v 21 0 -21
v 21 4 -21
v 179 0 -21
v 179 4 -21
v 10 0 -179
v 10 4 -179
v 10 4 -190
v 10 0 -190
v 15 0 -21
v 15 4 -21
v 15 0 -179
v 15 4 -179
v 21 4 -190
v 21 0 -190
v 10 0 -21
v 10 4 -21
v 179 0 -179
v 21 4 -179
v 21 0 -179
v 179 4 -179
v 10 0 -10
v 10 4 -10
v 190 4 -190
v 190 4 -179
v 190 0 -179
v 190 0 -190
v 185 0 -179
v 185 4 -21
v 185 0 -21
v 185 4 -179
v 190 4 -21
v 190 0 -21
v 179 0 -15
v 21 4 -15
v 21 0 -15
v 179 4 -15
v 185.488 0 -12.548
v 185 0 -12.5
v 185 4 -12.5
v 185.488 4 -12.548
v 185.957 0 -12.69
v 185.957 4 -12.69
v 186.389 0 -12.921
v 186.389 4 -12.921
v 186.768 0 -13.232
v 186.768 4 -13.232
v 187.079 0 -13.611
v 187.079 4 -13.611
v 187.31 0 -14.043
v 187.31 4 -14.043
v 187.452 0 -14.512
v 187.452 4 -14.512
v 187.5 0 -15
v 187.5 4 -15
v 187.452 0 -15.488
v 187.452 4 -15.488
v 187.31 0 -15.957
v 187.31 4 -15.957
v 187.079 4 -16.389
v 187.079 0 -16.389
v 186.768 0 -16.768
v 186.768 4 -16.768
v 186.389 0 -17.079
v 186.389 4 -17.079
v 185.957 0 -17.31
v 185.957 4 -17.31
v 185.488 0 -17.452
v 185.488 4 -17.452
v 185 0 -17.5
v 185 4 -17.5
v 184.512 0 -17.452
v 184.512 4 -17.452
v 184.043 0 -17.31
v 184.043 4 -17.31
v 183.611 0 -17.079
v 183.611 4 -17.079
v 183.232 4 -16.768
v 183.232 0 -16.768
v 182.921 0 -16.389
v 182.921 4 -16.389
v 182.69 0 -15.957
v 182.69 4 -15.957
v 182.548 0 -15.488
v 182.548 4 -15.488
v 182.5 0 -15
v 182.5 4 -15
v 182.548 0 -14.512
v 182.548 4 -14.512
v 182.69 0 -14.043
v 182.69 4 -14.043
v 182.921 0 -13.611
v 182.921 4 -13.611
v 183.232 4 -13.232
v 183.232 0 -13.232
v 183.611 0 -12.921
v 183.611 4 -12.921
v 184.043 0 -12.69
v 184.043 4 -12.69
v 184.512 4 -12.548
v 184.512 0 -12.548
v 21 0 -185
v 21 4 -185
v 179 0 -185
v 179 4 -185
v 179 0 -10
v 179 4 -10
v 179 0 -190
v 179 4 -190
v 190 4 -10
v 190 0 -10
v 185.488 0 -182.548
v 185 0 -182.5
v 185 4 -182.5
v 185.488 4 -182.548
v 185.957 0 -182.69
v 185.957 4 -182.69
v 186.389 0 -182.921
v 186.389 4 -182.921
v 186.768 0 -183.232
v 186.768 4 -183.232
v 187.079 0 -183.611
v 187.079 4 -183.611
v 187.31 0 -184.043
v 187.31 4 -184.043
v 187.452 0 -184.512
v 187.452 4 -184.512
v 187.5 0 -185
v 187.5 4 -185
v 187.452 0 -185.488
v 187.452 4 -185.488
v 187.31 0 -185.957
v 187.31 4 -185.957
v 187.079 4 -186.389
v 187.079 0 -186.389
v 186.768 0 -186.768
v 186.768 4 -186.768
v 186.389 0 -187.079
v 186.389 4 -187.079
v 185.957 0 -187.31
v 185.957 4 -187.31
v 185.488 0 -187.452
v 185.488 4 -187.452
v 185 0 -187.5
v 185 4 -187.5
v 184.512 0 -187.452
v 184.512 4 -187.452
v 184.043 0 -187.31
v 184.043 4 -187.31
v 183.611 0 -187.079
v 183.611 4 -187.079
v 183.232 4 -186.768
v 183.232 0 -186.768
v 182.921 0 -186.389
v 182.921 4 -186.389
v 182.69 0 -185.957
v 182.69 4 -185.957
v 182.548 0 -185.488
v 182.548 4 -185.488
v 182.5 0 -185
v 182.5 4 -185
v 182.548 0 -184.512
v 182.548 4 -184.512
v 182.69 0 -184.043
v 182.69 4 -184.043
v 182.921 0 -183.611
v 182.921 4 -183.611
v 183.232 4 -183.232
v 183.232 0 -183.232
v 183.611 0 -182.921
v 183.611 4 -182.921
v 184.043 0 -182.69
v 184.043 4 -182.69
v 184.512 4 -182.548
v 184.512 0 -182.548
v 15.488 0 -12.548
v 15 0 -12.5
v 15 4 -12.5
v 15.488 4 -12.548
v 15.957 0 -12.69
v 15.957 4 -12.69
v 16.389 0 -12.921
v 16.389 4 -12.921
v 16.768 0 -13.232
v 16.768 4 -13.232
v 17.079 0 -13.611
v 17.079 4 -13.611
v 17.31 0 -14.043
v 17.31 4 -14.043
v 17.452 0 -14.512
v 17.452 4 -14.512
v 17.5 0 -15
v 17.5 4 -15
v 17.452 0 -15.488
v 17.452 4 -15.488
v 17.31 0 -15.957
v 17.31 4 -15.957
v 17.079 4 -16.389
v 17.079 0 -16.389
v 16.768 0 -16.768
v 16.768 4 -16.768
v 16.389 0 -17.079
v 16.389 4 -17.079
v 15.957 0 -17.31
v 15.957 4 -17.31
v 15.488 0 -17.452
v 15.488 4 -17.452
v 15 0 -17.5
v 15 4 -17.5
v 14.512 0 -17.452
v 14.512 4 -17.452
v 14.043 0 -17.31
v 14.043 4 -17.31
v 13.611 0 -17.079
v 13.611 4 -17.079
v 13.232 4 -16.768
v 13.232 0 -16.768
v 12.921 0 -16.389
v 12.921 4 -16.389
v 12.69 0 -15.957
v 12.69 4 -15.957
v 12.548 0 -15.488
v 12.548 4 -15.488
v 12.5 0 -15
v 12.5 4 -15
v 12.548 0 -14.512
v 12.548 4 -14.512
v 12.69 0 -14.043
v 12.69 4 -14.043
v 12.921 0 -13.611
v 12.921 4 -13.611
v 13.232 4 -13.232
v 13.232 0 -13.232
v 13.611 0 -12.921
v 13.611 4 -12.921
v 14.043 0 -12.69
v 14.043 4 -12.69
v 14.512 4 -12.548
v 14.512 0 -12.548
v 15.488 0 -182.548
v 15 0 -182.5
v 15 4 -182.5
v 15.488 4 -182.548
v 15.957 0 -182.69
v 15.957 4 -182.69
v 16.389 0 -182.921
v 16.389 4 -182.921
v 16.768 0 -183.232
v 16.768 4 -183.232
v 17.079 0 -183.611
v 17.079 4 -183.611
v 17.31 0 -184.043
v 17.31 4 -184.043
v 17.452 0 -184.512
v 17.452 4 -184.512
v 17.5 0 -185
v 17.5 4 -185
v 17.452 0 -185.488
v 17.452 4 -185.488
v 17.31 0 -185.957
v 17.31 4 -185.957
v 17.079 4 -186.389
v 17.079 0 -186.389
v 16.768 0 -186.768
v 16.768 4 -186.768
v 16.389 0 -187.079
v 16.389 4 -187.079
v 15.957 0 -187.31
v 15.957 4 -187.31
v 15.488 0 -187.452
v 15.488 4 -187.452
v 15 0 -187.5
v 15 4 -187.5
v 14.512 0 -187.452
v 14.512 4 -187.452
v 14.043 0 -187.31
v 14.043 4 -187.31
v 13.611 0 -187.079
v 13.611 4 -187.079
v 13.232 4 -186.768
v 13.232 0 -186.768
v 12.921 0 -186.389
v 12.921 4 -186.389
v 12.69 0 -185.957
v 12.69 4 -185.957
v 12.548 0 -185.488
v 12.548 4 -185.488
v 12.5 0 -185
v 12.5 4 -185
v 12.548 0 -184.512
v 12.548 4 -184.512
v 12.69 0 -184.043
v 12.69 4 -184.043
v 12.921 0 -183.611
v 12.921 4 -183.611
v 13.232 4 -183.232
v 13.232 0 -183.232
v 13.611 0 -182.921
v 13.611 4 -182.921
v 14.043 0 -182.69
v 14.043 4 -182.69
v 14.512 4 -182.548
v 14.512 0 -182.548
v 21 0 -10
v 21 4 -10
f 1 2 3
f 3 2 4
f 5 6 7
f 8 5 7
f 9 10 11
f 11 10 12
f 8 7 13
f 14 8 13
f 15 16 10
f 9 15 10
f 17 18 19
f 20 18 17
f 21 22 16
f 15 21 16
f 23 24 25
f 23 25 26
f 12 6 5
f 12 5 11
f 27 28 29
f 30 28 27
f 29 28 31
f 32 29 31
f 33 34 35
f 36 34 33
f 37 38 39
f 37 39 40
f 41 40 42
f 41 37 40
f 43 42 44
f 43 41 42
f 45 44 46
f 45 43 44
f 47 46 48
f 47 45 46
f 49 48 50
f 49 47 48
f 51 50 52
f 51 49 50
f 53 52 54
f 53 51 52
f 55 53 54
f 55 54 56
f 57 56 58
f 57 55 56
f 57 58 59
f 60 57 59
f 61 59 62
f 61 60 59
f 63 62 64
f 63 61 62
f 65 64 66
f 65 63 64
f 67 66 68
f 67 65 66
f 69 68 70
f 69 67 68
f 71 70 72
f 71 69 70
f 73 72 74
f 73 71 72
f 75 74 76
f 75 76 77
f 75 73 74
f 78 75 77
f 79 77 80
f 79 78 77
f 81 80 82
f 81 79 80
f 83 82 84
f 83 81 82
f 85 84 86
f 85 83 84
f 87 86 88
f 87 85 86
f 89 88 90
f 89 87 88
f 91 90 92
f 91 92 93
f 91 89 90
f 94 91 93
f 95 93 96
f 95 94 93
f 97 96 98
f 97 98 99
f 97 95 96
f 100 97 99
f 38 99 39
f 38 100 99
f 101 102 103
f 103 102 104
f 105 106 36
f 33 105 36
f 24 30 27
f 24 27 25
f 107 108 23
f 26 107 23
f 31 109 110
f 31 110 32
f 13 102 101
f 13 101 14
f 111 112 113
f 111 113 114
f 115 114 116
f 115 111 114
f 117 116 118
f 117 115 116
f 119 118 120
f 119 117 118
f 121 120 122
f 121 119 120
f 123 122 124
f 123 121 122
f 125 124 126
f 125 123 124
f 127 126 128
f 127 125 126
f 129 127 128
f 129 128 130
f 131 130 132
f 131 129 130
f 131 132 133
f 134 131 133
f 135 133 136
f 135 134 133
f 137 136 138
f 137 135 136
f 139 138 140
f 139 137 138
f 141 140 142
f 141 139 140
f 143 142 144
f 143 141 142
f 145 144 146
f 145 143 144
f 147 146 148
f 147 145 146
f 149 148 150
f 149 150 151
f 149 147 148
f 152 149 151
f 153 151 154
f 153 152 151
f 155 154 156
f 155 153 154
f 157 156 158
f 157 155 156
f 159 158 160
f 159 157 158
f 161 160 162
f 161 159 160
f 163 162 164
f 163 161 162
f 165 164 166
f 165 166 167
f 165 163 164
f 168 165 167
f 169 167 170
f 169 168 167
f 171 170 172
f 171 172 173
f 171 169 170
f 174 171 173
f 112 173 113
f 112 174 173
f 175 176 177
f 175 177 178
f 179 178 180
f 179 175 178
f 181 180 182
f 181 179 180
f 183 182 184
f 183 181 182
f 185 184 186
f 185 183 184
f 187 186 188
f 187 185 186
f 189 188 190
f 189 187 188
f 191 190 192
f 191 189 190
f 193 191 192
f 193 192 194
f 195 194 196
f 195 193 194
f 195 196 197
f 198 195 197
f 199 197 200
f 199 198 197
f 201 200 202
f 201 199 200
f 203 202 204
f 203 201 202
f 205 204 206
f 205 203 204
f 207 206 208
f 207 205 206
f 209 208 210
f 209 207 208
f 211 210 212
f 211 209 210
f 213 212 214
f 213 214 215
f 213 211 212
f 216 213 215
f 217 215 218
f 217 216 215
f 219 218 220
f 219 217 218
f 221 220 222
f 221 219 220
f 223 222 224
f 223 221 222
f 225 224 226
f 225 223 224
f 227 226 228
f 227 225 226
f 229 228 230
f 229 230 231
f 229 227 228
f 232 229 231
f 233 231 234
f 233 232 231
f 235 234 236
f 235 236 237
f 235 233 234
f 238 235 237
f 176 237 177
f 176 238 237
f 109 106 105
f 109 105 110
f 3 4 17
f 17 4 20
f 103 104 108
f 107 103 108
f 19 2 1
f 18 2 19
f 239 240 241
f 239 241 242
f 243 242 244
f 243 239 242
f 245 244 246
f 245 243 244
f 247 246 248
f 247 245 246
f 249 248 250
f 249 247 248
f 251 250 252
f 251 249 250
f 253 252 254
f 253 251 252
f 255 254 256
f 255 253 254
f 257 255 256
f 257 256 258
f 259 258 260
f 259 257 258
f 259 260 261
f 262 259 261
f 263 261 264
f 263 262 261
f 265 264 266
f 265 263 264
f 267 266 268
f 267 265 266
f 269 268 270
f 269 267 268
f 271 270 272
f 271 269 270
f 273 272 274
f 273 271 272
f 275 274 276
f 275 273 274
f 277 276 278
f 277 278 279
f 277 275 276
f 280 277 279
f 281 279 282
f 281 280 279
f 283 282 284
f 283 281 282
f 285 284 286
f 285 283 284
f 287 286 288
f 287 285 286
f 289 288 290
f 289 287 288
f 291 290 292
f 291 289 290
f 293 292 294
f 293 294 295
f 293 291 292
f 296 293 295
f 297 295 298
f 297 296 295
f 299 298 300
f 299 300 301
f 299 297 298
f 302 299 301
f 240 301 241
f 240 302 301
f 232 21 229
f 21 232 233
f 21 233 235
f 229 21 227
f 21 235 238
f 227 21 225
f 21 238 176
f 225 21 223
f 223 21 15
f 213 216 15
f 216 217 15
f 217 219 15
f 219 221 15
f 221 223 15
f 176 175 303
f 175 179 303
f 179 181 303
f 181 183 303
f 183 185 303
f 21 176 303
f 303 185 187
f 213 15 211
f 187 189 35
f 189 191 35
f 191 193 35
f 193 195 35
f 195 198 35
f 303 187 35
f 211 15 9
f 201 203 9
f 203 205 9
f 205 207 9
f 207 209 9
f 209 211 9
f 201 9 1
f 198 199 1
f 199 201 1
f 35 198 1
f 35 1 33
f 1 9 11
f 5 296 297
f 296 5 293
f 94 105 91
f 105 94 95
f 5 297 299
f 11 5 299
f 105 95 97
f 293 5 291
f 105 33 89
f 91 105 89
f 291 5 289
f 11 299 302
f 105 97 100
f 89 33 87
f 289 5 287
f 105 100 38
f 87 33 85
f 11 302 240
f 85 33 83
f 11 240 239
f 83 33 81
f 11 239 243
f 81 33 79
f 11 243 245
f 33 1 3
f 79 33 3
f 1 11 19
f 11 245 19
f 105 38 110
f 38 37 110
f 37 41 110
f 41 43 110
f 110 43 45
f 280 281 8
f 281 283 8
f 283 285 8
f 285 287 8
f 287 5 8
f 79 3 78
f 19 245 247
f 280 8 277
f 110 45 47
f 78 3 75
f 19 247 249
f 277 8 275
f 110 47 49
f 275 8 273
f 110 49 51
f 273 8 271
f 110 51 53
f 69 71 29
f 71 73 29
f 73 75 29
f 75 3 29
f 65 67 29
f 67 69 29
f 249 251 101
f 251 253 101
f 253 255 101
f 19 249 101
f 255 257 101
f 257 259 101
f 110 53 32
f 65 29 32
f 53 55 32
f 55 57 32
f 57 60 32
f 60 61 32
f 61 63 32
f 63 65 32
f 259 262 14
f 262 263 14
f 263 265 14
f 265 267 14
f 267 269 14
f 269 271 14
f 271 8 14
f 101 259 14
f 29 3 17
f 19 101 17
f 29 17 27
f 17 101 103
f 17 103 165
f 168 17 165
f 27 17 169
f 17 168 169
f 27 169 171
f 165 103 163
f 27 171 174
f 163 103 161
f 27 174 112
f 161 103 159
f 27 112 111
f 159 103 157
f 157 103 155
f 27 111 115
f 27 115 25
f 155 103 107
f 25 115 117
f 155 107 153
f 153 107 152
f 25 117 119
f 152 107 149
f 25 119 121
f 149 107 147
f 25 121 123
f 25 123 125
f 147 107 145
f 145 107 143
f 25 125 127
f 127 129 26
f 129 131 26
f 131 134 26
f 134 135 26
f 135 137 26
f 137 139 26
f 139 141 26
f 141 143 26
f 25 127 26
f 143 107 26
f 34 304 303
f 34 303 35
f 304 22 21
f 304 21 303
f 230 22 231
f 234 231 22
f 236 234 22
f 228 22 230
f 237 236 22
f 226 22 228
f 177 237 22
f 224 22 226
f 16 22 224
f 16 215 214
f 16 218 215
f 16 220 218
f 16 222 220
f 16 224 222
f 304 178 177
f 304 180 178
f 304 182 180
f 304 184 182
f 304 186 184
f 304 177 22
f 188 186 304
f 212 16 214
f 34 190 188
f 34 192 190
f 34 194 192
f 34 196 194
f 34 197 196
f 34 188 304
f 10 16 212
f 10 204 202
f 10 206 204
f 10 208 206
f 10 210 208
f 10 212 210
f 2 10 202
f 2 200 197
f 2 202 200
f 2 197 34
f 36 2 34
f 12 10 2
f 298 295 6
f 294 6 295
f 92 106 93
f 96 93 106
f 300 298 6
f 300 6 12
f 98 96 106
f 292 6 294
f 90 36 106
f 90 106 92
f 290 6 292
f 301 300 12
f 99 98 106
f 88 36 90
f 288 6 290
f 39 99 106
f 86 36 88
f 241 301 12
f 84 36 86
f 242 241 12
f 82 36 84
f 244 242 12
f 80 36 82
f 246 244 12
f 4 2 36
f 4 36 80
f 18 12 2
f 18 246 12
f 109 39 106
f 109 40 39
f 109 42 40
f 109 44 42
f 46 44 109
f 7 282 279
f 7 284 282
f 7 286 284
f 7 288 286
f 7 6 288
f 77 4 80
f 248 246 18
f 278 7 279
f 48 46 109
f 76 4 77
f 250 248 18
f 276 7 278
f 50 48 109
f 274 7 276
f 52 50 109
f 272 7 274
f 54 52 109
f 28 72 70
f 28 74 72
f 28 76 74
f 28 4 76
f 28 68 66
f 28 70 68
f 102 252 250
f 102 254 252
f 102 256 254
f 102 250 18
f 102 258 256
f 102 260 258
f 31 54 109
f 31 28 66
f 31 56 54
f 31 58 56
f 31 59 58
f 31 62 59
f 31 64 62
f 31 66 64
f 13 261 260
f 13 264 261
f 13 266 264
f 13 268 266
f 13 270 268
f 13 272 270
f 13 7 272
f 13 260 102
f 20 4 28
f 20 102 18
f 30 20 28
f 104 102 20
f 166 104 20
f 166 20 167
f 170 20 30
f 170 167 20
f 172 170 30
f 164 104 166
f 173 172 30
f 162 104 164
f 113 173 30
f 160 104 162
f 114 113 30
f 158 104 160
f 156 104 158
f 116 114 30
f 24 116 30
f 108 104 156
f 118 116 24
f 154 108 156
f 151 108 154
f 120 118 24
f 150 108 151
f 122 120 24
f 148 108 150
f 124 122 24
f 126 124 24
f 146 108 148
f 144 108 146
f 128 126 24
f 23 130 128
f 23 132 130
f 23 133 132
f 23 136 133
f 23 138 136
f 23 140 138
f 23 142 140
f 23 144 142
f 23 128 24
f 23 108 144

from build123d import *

# Parameters (mm, degrees)
CROQUIS1_W              = 200
CROQUIS1_H              = 200
CROQUIS1_R              = 2.5
SALIENTE_EXTRUIR1_DEPTH = 4
CROQUIS2_W              = 158
CROQUIS2_H              = 158
CORTAR_EXTRUIR1_DEPTH   = 10
CROQUIS3_W              = 200
CROQUIS3_H              = 200
CROQUIS3_W_2            = 180
CROQUIS3_H_2            = 180
CORTAR_EXTRUIR2_DEPTH   = 10
CROQUIS4_W              = 158
CROQUIS4_H              = 5
CROQUIS4_W_2            = 5
CROQUIS4_H_2            = 158
CORTAR_EXTRUIR3_DEPTH   = 10


with BuildPart() as part:
    # Croquis1 → Saliente-Extruir1 (new body)
    with BuildSketch(Plane(origin=(0, 0, 0), x_dir=(1, 0, 0), z_dir=(0, 1, 0))):
        with Locations((100, 100)):
            Rectangle(CROQUIS1_W, CROQUIS1_H)
        with Locations(Location((15, 185, 0), (0, 0, 270))):
            Circle(CROQUIS1_R, mode=Mode.SUBTRACT)
        with Locations(Location((185, 185, 0), (0, 0, 270))):
            Circle(CROQUIS1_R, mode=Mode.SUBTRACT)
        with Locations(Location((185, 15, 0), (0, 0, 270))):
            Circle(CROQUIS1_R, mode=Mode.SUBTRACT)
        with Locations(Location((15, 15, 0), (0, 0, 270))):
            Circle(CROQUIS1_R, mode=Mode.SUBTRACT)
    extrude(amount=SALIENTE_EXTRUIR1_DEPTH)

    # Croquis2 → Cortar-Extruir1 (cut)
    with BuildSketch(Plane(origin=(0, 4, 0), x_dir=(1, 0, 0), z_dir=(0, 1, 0))):
        with Locations((100, 100)):
            Rectangle(CROQUIS2_W, CROQUIS2_H)
    extrude(amount=-CORTAR_EXTRUIR1_DEPTH, mode=Mode.SUBTRACT)

    # Croquis3 → Cortar-Extruir2 (cut)
    with BuildSketch(Plane(origin=(0, 4, 0), x_dir=(1, 0, 0), z_dir=(0, 1, 0))):
        with Locations((100, 100)):
            Rectangle(CROQUIS3_W, CROQUIS3_H)
        with Locations((100, 100)):
            Rectangle(CROQUIS3_W_2, CROQUIS3_H_2, mode=Mode.SUBTRACT)
    extrude(amount=-CORTAR_EXTRUIR2_DEPTH, mode=Mode.SUBTRACT)

    # Croquis4 → Cortar-Extruir3 (cut)
    with BuildSketch(Plane(origin=(0, 4, 0), x_dir=(1, 0, 0), z_dir=(0, 1, 0))):
        with Locations((100, 187.5)):
            Rectangle(CROQUIS4_W, CROQUIS4_H)
        with Locations((187.5, 100)):
            Rectangle(CROQUIS4_W_2, CROQUIS4_H_2)
        with Locations((100, 12.5)):
            Rectangle(CROQUIS4_W, CROQUIS4_H)
        with Locations((12.5, 100)):
            Rectangle(CROQUIS4_W_2, CROQUIS4_H_2)
    extrude(amount=-CORTAR_EXTRUIR3_DEPTH, mode=Mode.SUBTRACT)


solid = part.part
